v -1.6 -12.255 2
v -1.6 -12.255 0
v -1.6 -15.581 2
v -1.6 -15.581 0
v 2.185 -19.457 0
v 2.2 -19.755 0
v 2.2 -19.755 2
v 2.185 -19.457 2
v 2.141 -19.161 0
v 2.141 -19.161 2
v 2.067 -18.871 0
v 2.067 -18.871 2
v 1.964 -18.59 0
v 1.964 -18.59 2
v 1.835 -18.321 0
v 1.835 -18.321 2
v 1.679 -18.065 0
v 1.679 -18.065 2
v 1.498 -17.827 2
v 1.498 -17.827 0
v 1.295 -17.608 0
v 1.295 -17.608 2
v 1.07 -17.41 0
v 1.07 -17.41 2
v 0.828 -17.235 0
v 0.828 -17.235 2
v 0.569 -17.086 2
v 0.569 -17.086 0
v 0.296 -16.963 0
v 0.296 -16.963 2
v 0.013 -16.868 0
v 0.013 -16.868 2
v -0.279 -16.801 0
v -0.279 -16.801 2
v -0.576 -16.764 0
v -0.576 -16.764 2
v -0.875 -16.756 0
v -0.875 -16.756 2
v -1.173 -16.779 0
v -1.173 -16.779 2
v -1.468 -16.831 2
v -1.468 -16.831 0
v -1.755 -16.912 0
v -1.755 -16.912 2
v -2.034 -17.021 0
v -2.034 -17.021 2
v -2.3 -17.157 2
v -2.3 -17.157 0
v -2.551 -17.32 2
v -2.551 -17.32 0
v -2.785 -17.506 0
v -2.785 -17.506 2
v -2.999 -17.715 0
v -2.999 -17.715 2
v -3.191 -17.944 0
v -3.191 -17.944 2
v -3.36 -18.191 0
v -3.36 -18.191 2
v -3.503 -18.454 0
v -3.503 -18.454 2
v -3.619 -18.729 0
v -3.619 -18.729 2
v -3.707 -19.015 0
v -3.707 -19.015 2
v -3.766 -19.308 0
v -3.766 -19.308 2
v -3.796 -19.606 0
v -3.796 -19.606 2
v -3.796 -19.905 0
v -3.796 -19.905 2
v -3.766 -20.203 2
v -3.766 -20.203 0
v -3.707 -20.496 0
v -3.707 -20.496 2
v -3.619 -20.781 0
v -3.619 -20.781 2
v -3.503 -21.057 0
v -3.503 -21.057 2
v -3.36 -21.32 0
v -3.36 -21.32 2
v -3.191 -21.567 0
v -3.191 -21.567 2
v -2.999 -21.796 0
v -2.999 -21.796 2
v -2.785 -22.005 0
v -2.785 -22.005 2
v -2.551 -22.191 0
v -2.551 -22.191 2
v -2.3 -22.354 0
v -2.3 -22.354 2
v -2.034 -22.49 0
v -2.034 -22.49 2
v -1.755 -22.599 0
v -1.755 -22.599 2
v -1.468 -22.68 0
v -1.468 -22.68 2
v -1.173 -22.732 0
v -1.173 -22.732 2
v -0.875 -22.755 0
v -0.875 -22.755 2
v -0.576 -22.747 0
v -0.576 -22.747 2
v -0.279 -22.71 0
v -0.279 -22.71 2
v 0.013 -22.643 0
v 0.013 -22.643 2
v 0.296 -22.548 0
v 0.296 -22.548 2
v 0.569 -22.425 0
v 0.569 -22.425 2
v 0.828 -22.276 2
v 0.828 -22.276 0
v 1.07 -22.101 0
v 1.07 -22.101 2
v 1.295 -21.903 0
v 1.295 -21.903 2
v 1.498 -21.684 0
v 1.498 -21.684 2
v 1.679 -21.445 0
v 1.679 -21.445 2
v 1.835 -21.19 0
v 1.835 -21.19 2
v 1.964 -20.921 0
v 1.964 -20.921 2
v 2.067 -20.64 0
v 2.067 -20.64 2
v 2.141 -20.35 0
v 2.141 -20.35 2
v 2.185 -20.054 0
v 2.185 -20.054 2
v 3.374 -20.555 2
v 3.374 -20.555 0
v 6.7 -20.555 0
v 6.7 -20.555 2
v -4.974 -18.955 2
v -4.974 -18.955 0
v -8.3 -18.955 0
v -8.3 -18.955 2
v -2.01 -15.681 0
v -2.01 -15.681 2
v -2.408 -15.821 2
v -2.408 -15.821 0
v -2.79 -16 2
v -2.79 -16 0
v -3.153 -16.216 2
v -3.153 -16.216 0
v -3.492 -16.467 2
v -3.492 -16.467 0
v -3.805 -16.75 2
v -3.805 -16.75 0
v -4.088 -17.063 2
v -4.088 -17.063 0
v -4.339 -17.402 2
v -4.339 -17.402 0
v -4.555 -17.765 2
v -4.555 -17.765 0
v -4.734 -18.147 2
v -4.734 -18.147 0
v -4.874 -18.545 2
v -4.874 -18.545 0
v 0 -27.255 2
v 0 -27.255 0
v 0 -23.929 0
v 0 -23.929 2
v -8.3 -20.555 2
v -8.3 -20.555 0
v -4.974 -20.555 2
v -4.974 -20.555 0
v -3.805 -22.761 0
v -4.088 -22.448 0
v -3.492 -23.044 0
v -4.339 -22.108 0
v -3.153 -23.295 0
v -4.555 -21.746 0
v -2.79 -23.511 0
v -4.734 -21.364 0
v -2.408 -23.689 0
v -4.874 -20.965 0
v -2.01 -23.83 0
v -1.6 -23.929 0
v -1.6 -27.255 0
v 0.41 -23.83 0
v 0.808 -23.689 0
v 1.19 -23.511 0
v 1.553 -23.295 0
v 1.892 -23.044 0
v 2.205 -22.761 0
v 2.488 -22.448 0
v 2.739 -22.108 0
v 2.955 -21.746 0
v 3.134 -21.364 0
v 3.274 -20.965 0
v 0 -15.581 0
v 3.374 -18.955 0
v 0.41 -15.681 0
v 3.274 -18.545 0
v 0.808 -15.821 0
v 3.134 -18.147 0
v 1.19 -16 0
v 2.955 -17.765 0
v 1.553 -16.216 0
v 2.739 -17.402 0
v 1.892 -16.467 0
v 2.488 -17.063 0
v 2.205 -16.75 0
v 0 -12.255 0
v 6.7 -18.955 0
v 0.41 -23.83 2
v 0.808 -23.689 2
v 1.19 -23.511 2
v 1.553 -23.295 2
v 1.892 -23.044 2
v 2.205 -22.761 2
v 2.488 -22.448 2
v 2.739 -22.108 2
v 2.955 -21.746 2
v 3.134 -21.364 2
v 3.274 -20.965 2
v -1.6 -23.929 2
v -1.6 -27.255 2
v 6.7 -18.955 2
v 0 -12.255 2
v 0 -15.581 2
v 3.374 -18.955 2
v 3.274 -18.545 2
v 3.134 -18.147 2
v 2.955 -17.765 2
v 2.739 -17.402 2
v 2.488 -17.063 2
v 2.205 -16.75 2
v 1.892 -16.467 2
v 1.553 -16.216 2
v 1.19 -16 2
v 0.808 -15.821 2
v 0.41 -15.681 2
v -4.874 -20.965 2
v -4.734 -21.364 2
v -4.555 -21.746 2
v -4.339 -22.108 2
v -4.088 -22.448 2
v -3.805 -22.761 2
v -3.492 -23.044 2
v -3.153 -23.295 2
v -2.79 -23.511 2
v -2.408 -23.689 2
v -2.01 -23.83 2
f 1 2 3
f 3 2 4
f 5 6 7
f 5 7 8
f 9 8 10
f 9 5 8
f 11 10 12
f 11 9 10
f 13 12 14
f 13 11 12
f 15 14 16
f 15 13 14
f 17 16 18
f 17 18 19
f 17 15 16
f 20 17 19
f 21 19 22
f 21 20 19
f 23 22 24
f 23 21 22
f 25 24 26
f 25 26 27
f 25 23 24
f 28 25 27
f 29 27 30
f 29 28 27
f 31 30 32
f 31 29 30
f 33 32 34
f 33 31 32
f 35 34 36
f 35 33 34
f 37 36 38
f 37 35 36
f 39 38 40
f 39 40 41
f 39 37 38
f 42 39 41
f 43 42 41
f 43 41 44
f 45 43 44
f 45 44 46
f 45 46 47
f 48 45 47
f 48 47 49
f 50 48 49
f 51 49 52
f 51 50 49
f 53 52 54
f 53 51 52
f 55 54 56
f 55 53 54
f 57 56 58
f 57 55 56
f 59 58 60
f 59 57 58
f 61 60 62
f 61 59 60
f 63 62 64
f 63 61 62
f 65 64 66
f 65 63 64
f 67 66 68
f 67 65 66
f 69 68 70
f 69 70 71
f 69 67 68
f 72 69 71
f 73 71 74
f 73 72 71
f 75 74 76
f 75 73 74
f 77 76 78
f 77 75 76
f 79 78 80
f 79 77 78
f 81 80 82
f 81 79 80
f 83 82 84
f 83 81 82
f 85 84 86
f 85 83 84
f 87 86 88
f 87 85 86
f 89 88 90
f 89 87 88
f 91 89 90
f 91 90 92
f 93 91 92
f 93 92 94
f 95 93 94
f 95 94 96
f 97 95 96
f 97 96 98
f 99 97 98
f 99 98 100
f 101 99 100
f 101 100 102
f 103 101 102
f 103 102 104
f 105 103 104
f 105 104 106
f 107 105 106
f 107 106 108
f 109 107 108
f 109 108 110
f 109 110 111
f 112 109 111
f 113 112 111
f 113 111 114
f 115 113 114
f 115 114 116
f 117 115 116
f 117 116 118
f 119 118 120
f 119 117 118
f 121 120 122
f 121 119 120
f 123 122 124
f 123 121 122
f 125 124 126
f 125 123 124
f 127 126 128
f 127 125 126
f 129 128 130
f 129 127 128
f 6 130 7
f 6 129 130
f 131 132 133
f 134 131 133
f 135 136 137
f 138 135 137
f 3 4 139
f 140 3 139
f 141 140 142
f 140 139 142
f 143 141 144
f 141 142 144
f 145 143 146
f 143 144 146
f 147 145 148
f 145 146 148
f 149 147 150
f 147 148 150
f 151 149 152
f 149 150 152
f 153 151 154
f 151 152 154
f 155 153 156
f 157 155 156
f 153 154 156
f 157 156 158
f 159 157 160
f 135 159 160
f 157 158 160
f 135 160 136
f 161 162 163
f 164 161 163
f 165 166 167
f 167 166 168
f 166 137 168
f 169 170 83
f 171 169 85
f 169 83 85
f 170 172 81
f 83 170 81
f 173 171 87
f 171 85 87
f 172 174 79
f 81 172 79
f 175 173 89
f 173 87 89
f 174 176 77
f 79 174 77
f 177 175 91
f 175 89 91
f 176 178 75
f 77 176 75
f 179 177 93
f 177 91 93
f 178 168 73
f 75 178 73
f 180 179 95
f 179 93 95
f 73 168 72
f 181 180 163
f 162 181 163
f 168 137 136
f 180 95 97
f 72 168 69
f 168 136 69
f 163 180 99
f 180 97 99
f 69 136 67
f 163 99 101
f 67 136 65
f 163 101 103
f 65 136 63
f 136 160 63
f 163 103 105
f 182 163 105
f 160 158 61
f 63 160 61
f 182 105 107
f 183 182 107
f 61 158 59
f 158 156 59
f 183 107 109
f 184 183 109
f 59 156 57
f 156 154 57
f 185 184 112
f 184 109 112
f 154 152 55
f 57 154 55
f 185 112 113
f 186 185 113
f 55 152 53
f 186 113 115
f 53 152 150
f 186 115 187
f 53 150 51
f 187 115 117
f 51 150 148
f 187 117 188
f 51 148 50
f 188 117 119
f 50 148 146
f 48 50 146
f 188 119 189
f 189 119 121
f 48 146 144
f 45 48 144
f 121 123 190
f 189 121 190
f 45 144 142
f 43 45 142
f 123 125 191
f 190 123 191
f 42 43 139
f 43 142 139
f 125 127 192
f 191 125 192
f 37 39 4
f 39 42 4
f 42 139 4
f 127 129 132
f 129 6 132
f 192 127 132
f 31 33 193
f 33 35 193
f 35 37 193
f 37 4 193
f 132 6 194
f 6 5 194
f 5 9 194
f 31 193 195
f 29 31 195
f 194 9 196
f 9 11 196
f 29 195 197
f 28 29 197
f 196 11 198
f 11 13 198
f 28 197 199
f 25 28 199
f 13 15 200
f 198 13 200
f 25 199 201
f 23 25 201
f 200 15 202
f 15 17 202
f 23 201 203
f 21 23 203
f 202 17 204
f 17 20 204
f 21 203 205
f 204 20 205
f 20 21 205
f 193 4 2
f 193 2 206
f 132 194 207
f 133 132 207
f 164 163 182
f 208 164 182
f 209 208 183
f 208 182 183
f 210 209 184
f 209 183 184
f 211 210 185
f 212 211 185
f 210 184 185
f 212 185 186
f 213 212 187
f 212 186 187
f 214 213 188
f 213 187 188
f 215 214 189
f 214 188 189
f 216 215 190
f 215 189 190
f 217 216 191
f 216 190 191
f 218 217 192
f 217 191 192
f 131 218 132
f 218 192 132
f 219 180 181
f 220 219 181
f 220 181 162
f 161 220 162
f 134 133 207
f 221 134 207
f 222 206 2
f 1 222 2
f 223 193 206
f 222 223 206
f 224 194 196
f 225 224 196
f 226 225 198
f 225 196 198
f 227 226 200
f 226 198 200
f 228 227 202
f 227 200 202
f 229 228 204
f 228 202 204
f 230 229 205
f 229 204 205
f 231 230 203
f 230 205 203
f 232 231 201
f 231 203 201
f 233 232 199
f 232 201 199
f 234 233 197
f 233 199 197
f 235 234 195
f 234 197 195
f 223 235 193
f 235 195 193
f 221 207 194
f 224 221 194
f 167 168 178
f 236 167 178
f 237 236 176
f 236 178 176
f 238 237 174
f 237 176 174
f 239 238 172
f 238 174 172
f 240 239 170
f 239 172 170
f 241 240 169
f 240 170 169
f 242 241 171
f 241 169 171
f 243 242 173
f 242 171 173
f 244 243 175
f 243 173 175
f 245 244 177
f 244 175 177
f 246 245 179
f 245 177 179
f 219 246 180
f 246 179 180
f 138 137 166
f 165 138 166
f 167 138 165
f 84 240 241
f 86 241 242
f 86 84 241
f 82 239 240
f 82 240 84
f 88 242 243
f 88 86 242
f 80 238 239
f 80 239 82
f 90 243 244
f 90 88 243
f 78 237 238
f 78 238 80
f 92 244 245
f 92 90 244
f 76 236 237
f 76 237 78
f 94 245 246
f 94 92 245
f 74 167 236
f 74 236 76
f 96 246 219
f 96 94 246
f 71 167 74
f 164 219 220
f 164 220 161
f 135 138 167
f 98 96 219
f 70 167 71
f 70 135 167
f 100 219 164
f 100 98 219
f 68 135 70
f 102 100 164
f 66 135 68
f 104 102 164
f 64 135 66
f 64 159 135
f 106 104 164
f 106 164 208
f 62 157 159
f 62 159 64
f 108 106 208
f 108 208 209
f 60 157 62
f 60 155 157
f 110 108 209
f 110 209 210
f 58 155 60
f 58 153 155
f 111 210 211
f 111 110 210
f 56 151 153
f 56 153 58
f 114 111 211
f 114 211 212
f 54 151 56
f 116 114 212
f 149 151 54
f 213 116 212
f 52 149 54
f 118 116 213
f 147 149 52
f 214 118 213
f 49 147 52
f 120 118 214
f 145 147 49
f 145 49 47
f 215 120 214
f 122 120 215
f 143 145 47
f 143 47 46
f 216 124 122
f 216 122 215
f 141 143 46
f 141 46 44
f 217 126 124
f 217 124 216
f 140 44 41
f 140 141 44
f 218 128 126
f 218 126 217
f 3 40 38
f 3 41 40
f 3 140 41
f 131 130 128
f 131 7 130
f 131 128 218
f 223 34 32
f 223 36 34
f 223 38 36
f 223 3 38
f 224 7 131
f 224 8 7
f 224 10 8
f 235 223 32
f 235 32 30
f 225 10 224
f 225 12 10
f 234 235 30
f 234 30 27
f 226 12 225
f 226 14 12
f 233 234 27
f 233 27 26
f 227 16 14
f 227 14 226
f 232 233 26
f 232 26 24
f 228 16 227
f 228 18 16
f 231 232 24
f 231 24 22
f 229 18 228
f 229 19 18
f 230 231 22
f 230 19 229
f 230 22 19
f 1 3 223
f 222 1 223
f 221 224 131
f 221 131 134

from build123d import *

# Parameters (mm, degrees)
F0_R     = 3
F1_DEPTH = 2


with BuildPart() as f1:
    # F0 (on Top) → F1 (new body)
    with BuildSketch(Plane.XY):
        with BuildLine():
            Line((0, -12.255436), (-1.6, -12.255436))
            Line((-1.6, -12.255436), (-1.6, -15.58141))
            ThreePointArc((-1.6, -15.58141), (-3.805204, -16.750233), (-4.974027, -18.955436))
            Line((-4.974027, -18.955436), (-8.3, -18.955436))
            Line((-8.3, -18.955436), (-8.3, -20.555436))
            Line((-8.3, -20.555436), (-4.974027, -20.555436))
            ThreePointArc((-4.974027, -20.555436), (-3.805204, -22.76064), (-1.6, -23.929463))
            Line((-1.6, -23.929463), (-1.6, -27.255436))
            Line((-1.6, -27.255436), (0, -27.255436))
            Line((0, -27.255436), (0, -23.929463))
            ThreePointArc((0, -23.929463), (2.205204, -22.76064), (3.374027, -20.555436))
            Line((3.374027, -20.555436), (6.7, -20.555436))
            Line((6.7, -20.555436), (6.7, -18.955436))
            Line((6.7, -18.955436), (3.374027, -18.955436))
            ThreePointArc((3.374027, -18.955436), (2.205204, -16.750233), (0, -15.58141))
            Line((0, -15.58141), (0, -12.255436))
        make_face()
        with Locations((-0.8, -19.755436)):
            Circle(F0_R, mode=Mode.SUBTRACT)
    extrude(amount=F1_DEPTH)


solid = f1.part
